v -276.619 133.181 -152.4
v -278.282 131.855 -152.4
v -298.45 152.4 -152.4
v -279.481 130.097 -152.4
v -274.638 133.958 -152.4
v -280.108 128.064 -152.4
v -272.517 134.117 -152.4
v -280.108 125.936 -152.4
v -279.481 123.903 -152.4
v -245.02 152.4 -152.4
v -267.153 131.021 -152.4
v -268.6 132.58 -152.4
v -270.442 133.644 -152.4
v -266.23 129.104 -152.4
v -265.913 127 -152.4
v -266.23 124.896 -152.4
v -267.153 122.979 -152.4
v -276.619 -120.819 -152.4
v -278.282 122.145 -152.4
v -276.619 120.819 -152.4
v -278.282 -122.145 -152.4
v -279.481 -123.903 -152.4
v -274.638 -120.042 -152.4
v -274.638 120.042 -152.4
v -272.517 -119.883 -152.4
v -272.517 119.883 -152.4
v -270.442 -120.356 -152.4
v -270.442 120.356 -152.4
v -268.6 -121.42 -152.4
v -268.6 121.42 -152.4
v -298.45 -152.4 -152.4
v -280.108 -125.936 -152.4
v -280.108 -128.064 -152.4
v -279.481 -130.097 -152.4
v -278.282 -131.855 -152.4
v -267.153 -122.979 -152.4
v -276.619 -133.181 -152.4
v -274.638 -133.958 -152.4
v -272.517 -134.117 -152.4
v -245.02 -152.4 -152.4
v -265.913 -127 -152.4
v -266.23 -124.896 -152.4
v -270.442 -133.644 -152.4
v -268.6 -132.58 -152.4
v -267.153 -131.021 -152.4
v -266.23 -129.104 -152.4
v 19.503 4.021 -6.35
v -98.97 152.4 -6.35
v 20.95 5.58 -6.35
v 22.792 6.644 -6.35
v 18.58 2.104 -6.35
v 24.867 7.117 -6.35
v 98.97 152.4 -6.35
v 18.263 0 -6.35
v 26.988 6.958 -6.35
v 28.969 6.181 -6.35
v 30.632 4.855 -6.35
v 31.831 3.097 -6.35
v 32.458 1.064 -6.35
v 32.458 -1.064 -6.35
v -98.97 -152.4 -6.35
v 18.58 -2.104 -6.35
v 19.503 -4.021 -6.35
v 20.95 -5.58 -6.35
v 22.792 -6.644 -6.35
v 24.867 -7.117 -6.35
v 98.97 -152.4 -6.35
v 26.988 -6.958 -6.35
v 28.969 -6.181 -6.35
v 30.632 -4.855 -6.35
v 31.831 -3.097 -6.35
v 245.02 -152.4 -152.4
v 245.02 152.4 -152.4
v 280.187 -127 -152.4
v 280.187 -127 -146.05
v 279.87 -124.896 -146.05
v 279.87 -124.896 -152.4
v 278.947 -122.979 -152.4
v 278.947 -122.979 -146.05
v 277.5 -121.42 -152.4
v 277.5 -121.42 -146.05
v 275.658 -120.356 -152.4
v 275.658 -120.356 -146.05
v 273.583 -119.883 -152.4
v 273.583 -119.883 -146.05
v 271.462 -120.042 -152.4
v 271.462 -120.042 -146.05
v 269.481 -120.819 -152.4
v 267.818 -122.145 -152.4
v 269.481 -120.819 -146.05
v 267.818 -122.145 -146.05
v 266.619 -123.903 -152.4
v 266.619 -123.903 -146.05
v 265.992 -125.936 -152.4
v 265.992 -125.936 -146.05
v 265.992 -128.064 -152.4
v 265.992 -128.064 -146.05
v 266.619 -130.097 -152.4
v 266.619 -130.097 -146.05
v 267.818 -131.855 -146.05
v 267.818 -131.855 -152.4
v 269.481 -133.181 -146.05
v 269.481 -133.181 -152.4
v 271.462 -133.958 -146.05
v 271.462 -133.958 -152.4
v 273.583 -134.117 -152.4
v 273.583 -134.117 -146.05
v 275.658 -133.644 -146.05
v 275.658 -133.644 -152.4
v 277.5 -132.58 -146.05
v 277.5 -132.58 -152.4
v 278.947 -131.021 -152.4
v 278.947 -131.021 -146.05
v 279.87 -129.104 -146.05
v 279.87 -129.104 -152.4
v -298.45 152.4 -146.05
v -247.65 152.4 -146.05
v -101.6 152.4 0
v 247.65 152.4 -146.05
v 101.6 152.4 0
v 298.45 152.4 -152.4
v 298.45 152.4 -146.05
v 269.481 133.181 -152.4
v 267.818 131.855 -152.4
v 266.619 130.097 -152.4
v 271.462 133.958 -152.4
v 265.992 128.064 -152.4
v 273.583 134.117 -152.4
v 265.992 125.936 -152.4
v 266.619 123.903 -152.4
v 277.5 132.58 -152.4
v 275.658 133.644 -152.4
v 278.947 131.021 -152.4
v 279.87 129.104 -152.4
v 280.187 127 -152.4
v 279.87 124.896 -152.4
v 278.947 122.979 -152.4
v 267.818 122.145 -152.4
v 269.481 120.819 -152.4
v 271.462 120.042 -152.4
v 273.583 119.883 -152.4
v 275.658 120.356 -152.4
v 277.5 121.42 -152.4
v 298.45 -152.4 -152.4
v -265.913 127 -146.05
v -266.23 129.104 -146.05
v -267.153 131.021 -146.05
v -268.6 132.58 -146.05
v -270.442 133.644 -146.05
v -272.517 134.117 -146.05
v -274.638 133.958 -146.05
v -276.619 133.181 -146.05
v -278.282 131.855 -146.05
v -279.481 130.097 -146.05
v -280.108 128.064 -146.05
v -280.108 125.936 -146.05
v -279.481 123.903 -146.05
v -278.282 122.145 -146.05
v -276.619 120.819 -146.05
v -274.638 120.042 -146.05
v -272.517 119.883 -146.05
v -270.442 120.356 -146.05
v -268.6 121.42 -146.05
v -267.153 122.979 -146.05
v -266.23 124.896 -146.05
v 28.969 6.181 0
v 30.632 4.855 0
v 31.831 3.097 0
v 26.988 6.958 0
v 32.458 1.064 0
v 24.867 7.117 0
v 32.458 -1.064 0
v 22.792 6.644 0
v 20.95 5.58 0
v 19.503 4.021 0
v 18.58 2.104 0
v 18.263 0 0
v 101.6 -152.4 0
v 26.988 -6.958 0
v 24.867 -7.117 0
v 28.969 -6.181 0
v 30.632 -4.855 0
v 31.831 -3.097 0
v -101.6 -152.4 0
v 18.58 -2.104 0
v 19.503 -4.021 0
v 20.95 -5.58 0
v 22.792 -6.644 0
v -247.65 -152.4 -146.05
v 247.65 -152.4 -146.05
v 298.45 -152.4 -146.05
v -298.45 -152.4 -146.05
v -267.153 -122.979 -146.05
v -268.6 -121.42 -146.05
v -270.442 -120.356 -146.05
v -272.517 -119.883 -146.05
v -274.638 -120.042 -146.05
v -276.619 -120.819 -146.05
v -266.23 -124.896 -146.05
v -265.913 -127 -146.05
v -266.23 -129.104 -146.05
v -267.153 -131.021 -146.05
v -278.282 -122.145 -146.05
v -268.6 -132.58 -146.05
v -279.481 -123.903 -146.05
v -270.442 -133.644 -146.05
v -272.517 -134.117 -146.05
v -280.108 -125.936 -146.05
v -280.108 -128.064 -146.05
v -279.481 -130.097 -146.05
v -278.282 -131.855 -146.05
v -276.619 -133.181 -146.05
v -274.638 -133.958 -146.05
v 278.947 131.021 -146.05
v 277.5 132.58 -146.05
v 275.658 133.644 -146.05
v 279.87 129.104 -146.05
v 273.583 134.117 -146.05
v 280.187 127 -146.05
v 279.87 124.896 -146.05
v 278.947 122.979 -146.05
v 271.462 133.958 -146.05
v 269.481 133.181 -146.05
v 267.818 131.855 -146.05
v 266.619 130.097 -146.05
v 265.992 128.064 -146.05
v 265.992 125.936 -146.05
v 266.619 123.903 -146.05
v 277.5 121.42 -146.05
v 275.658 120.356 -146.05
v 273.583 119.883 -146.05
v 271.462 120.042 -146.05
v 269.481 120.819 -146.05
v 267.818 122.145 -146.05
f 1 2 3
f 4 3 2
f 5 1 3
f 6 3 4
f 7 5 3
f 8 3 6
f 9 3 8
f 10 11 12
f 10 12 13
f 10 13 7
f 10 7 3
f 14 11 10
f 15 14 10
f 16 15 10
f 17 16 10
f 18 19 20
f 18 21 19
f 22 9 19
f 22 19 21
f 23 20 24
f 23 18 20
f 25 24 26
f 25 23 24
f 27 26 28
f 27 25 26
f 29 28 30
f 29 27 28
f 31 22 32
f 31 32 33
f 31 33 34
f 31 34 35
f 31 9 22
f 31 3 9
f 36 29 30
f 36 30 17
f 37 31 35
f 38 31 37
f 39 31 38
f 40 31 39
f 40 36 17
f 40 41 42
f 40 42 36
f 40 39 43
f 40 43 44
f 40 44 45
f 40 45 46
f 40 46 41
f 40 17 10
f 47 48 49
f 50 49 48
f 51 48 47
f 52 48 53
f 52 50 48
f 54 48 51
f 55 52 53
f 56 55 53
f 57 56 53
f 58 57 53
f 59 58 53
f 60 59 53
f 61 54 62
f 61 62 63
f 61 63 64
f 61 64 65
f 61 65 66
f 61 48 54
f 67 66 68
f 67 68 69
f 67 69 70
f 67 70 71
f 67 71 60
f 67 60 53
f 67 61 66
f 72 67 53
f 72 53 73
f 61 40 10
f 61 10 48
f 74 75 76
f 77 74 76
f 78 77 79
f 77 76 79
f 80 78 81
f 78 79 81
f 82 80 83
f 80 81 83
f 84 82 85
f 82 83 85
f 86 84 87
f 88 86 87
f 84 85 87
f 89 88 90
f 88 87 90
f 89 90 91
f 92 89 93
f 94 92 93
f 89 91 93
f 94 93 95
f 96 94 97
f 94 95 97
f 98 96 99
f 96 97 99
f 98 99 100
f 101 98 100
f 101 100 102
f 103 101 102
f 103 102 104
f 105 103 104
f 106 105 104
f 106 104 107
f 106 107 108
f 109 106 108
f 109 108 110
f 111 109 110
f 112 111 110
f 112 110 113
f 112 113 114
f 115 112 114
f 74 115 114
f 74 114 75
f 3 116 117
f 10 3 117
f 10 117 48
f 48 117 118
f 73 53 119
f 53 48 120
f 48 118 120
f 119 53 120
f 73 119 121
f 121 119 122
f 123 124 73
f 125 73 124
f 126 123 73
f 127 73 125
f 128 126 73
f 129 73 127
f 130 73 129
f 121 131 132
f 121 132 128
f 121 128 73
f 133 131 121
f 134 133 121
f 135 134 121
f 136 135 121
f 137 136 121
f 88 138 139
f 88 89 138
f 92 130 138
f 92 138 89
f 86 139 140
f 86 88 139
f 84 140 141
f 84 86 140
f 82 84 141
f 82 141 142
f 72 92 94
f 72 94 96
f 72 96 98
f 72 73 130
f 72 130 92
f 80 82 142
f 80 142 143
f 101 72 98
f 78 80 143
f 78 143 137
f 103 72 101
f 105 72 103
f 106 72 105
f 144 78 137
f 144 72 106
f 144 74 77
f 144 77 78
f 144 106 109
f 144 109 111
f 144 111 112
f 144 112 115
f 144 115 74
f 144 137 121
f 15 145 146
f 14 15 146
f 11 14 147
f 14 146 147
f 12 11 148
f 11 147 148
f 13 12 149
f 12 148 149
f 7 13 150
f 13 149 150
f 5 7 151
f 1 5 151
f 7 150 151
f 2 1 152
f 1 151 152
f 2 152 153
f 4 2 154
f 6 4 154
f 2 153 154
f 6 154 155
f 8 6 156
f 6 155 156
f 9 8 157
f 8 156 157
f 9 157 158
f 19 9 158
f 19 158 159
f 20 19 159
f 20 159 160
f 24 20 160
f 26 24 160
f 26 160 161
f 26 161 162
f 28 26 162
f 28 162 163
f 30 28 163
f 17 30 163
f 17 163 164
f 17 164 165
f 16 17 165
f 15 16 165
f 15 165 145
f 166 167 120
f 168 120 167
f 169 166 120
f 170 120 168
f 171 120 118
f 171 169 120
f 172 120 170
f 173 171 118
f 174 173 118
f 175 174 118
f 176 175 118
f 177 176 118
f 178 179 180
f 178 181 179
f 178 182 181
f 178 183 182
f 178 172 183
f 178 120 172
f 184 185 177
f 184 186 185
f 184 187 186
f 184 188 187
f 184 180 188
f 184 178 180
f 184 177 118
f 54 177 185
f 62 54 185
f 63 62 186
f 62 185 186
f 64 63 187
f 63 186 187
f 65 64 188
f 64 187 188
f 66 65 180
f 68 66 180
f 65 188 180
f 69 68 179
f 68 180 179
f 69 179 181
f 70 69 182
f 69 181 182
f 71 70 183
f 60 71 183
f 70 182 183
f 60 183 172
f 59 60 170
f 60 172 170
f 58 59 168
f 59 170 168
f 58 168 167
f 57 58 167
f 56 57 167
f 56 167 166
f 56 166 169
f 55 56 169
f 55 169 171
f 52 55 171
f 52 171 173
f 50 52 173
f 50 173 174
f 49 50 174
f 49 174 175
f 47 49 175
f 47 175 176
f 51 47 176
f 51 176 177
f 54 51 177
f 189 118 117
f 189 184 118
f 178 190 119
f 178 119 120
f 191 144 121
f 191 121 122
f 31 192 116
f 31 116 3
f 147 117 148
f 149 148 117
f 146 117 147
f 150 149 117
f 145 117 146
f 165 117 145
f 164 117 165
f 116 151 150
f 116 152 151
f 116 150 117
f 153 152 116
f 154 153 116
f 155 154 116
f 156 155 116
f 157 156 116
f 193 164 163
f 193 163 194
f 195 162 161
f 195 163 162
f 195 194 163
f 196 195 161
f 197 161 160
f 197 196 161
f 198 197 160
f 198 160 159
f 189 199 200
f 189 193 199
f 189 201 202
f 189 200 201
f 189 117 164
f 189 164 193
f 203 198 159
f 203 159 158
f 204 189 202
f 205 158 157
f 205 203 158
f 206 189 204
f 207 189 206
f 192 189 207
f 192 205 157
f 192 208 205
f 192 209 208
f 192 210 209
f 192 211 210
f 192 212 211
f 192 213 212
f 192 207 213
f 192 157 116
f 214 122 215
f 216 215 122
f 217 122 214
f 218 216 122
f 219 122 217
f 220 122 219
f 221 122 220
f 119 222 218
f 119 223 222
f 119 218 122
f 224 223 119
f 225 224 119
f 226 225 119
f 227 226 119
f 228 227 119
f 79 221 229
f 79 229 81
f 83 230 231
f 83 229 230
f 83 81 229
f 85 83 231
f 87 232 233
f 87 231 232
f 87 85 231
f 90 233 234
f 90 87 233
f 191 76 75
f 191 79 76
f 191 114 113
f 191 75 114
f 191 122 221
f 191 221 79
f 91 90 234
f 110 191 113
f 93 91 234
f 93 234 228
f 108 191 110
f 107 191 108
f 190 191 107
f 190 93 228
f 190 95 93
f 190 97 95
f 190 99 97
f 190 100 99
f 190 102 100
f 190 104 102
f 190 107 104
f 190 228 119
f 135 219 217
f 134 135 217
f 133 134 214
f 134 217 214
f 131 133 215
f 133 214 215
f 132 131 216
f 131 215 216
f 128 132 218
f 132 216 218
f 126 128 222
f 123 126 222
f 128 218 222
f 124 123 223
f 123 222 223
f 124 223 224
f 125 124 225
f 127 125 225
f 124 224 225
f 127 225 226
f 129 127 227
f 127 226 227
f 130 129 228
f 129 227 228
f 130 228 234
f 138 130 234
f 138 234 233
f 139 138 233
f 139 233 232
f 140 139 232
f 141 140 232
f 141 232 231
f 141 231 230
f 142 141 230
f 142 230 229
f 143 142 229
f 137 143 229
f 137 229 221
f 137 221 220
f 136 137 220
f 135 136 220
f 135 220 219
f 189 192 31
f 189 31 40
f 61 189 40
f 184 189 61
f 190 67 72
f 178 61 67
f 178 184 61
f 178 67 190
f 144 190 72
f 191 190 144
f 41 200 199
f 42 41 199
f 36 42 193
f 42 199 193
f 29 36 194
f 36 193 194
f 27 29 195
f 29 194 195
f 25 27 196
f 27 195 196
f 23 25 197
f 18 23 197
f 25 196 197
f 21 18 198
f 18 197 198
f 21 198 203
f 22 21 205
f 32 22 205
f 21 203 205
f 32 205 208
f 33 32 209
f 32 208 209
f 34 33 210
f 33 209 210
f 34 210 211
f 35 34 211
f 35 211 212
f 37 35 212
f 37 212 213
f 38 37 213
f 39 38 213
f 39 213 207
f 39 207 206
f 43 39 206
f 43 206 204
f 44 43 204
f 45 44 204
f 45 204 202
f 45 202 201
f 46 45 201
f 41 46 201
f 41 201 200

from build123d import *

# Parameters (mm, degrees)
F1_DEPTH = 152.4
F2_R     = 7.1374
F3_DEPTH = 6.351
F5_DEPTH = 152.401


with BuildPart() as f1:
    # F0 (on Front) → F1 (new body, symmetric)
    with BuildSketch(Plane.XZ):
        Polygon((-247.65, -146.05), (-298.45, -146.05), (-298.45, -152.4), (-245.019744, -152.4), (-98.969744, -6.35), (98.969744, -6.35), (245.019744, -152.4), (298.45, -152.4), (298.45, -146.05), (247.65, -146.05), (101.6, 0), (-101.6, 0), align=None)
    extrude(amount=F1_DEPTH, both=True)

    # F2 (on face) → F3 (cut, through all)
    with BuildSketch(Plane.XY.offset(-146.05)):
        with Locations((-273.05, 127)):
            Circle(F2_R)
        with Locations((-273.05, -127)):
            Circle(F2_R)
        with Locations((273.05, 127)):
            Circle(F2_R)
        with Locations((273.05, -127)):
            Circle(F2_R)
    extrude(amount=-F3_DEPTH, mode=Mode.SUBTRACT)

    # F4 (on face) → F5 (cut, through all)
    with BuildSketch(Plane.XY):
        with BuildLine():
            ThreePointArc((32.5374, 0), (25.4, 7.1374), (18.2626, 0))
            Line((18.2626, 0), (32.5374, 0))
        make_face()
        with BuildLine():
            Line((32.5374, 0), (18.2626, 0))
            ThreePointArc((18.2626, 0), (25.4, -7.1374), (32.5374, 0))
        make_face()
    extrude(amount=-F5_DEPTH, mode=Mode.SUBTRACT)


solid = f1.part
